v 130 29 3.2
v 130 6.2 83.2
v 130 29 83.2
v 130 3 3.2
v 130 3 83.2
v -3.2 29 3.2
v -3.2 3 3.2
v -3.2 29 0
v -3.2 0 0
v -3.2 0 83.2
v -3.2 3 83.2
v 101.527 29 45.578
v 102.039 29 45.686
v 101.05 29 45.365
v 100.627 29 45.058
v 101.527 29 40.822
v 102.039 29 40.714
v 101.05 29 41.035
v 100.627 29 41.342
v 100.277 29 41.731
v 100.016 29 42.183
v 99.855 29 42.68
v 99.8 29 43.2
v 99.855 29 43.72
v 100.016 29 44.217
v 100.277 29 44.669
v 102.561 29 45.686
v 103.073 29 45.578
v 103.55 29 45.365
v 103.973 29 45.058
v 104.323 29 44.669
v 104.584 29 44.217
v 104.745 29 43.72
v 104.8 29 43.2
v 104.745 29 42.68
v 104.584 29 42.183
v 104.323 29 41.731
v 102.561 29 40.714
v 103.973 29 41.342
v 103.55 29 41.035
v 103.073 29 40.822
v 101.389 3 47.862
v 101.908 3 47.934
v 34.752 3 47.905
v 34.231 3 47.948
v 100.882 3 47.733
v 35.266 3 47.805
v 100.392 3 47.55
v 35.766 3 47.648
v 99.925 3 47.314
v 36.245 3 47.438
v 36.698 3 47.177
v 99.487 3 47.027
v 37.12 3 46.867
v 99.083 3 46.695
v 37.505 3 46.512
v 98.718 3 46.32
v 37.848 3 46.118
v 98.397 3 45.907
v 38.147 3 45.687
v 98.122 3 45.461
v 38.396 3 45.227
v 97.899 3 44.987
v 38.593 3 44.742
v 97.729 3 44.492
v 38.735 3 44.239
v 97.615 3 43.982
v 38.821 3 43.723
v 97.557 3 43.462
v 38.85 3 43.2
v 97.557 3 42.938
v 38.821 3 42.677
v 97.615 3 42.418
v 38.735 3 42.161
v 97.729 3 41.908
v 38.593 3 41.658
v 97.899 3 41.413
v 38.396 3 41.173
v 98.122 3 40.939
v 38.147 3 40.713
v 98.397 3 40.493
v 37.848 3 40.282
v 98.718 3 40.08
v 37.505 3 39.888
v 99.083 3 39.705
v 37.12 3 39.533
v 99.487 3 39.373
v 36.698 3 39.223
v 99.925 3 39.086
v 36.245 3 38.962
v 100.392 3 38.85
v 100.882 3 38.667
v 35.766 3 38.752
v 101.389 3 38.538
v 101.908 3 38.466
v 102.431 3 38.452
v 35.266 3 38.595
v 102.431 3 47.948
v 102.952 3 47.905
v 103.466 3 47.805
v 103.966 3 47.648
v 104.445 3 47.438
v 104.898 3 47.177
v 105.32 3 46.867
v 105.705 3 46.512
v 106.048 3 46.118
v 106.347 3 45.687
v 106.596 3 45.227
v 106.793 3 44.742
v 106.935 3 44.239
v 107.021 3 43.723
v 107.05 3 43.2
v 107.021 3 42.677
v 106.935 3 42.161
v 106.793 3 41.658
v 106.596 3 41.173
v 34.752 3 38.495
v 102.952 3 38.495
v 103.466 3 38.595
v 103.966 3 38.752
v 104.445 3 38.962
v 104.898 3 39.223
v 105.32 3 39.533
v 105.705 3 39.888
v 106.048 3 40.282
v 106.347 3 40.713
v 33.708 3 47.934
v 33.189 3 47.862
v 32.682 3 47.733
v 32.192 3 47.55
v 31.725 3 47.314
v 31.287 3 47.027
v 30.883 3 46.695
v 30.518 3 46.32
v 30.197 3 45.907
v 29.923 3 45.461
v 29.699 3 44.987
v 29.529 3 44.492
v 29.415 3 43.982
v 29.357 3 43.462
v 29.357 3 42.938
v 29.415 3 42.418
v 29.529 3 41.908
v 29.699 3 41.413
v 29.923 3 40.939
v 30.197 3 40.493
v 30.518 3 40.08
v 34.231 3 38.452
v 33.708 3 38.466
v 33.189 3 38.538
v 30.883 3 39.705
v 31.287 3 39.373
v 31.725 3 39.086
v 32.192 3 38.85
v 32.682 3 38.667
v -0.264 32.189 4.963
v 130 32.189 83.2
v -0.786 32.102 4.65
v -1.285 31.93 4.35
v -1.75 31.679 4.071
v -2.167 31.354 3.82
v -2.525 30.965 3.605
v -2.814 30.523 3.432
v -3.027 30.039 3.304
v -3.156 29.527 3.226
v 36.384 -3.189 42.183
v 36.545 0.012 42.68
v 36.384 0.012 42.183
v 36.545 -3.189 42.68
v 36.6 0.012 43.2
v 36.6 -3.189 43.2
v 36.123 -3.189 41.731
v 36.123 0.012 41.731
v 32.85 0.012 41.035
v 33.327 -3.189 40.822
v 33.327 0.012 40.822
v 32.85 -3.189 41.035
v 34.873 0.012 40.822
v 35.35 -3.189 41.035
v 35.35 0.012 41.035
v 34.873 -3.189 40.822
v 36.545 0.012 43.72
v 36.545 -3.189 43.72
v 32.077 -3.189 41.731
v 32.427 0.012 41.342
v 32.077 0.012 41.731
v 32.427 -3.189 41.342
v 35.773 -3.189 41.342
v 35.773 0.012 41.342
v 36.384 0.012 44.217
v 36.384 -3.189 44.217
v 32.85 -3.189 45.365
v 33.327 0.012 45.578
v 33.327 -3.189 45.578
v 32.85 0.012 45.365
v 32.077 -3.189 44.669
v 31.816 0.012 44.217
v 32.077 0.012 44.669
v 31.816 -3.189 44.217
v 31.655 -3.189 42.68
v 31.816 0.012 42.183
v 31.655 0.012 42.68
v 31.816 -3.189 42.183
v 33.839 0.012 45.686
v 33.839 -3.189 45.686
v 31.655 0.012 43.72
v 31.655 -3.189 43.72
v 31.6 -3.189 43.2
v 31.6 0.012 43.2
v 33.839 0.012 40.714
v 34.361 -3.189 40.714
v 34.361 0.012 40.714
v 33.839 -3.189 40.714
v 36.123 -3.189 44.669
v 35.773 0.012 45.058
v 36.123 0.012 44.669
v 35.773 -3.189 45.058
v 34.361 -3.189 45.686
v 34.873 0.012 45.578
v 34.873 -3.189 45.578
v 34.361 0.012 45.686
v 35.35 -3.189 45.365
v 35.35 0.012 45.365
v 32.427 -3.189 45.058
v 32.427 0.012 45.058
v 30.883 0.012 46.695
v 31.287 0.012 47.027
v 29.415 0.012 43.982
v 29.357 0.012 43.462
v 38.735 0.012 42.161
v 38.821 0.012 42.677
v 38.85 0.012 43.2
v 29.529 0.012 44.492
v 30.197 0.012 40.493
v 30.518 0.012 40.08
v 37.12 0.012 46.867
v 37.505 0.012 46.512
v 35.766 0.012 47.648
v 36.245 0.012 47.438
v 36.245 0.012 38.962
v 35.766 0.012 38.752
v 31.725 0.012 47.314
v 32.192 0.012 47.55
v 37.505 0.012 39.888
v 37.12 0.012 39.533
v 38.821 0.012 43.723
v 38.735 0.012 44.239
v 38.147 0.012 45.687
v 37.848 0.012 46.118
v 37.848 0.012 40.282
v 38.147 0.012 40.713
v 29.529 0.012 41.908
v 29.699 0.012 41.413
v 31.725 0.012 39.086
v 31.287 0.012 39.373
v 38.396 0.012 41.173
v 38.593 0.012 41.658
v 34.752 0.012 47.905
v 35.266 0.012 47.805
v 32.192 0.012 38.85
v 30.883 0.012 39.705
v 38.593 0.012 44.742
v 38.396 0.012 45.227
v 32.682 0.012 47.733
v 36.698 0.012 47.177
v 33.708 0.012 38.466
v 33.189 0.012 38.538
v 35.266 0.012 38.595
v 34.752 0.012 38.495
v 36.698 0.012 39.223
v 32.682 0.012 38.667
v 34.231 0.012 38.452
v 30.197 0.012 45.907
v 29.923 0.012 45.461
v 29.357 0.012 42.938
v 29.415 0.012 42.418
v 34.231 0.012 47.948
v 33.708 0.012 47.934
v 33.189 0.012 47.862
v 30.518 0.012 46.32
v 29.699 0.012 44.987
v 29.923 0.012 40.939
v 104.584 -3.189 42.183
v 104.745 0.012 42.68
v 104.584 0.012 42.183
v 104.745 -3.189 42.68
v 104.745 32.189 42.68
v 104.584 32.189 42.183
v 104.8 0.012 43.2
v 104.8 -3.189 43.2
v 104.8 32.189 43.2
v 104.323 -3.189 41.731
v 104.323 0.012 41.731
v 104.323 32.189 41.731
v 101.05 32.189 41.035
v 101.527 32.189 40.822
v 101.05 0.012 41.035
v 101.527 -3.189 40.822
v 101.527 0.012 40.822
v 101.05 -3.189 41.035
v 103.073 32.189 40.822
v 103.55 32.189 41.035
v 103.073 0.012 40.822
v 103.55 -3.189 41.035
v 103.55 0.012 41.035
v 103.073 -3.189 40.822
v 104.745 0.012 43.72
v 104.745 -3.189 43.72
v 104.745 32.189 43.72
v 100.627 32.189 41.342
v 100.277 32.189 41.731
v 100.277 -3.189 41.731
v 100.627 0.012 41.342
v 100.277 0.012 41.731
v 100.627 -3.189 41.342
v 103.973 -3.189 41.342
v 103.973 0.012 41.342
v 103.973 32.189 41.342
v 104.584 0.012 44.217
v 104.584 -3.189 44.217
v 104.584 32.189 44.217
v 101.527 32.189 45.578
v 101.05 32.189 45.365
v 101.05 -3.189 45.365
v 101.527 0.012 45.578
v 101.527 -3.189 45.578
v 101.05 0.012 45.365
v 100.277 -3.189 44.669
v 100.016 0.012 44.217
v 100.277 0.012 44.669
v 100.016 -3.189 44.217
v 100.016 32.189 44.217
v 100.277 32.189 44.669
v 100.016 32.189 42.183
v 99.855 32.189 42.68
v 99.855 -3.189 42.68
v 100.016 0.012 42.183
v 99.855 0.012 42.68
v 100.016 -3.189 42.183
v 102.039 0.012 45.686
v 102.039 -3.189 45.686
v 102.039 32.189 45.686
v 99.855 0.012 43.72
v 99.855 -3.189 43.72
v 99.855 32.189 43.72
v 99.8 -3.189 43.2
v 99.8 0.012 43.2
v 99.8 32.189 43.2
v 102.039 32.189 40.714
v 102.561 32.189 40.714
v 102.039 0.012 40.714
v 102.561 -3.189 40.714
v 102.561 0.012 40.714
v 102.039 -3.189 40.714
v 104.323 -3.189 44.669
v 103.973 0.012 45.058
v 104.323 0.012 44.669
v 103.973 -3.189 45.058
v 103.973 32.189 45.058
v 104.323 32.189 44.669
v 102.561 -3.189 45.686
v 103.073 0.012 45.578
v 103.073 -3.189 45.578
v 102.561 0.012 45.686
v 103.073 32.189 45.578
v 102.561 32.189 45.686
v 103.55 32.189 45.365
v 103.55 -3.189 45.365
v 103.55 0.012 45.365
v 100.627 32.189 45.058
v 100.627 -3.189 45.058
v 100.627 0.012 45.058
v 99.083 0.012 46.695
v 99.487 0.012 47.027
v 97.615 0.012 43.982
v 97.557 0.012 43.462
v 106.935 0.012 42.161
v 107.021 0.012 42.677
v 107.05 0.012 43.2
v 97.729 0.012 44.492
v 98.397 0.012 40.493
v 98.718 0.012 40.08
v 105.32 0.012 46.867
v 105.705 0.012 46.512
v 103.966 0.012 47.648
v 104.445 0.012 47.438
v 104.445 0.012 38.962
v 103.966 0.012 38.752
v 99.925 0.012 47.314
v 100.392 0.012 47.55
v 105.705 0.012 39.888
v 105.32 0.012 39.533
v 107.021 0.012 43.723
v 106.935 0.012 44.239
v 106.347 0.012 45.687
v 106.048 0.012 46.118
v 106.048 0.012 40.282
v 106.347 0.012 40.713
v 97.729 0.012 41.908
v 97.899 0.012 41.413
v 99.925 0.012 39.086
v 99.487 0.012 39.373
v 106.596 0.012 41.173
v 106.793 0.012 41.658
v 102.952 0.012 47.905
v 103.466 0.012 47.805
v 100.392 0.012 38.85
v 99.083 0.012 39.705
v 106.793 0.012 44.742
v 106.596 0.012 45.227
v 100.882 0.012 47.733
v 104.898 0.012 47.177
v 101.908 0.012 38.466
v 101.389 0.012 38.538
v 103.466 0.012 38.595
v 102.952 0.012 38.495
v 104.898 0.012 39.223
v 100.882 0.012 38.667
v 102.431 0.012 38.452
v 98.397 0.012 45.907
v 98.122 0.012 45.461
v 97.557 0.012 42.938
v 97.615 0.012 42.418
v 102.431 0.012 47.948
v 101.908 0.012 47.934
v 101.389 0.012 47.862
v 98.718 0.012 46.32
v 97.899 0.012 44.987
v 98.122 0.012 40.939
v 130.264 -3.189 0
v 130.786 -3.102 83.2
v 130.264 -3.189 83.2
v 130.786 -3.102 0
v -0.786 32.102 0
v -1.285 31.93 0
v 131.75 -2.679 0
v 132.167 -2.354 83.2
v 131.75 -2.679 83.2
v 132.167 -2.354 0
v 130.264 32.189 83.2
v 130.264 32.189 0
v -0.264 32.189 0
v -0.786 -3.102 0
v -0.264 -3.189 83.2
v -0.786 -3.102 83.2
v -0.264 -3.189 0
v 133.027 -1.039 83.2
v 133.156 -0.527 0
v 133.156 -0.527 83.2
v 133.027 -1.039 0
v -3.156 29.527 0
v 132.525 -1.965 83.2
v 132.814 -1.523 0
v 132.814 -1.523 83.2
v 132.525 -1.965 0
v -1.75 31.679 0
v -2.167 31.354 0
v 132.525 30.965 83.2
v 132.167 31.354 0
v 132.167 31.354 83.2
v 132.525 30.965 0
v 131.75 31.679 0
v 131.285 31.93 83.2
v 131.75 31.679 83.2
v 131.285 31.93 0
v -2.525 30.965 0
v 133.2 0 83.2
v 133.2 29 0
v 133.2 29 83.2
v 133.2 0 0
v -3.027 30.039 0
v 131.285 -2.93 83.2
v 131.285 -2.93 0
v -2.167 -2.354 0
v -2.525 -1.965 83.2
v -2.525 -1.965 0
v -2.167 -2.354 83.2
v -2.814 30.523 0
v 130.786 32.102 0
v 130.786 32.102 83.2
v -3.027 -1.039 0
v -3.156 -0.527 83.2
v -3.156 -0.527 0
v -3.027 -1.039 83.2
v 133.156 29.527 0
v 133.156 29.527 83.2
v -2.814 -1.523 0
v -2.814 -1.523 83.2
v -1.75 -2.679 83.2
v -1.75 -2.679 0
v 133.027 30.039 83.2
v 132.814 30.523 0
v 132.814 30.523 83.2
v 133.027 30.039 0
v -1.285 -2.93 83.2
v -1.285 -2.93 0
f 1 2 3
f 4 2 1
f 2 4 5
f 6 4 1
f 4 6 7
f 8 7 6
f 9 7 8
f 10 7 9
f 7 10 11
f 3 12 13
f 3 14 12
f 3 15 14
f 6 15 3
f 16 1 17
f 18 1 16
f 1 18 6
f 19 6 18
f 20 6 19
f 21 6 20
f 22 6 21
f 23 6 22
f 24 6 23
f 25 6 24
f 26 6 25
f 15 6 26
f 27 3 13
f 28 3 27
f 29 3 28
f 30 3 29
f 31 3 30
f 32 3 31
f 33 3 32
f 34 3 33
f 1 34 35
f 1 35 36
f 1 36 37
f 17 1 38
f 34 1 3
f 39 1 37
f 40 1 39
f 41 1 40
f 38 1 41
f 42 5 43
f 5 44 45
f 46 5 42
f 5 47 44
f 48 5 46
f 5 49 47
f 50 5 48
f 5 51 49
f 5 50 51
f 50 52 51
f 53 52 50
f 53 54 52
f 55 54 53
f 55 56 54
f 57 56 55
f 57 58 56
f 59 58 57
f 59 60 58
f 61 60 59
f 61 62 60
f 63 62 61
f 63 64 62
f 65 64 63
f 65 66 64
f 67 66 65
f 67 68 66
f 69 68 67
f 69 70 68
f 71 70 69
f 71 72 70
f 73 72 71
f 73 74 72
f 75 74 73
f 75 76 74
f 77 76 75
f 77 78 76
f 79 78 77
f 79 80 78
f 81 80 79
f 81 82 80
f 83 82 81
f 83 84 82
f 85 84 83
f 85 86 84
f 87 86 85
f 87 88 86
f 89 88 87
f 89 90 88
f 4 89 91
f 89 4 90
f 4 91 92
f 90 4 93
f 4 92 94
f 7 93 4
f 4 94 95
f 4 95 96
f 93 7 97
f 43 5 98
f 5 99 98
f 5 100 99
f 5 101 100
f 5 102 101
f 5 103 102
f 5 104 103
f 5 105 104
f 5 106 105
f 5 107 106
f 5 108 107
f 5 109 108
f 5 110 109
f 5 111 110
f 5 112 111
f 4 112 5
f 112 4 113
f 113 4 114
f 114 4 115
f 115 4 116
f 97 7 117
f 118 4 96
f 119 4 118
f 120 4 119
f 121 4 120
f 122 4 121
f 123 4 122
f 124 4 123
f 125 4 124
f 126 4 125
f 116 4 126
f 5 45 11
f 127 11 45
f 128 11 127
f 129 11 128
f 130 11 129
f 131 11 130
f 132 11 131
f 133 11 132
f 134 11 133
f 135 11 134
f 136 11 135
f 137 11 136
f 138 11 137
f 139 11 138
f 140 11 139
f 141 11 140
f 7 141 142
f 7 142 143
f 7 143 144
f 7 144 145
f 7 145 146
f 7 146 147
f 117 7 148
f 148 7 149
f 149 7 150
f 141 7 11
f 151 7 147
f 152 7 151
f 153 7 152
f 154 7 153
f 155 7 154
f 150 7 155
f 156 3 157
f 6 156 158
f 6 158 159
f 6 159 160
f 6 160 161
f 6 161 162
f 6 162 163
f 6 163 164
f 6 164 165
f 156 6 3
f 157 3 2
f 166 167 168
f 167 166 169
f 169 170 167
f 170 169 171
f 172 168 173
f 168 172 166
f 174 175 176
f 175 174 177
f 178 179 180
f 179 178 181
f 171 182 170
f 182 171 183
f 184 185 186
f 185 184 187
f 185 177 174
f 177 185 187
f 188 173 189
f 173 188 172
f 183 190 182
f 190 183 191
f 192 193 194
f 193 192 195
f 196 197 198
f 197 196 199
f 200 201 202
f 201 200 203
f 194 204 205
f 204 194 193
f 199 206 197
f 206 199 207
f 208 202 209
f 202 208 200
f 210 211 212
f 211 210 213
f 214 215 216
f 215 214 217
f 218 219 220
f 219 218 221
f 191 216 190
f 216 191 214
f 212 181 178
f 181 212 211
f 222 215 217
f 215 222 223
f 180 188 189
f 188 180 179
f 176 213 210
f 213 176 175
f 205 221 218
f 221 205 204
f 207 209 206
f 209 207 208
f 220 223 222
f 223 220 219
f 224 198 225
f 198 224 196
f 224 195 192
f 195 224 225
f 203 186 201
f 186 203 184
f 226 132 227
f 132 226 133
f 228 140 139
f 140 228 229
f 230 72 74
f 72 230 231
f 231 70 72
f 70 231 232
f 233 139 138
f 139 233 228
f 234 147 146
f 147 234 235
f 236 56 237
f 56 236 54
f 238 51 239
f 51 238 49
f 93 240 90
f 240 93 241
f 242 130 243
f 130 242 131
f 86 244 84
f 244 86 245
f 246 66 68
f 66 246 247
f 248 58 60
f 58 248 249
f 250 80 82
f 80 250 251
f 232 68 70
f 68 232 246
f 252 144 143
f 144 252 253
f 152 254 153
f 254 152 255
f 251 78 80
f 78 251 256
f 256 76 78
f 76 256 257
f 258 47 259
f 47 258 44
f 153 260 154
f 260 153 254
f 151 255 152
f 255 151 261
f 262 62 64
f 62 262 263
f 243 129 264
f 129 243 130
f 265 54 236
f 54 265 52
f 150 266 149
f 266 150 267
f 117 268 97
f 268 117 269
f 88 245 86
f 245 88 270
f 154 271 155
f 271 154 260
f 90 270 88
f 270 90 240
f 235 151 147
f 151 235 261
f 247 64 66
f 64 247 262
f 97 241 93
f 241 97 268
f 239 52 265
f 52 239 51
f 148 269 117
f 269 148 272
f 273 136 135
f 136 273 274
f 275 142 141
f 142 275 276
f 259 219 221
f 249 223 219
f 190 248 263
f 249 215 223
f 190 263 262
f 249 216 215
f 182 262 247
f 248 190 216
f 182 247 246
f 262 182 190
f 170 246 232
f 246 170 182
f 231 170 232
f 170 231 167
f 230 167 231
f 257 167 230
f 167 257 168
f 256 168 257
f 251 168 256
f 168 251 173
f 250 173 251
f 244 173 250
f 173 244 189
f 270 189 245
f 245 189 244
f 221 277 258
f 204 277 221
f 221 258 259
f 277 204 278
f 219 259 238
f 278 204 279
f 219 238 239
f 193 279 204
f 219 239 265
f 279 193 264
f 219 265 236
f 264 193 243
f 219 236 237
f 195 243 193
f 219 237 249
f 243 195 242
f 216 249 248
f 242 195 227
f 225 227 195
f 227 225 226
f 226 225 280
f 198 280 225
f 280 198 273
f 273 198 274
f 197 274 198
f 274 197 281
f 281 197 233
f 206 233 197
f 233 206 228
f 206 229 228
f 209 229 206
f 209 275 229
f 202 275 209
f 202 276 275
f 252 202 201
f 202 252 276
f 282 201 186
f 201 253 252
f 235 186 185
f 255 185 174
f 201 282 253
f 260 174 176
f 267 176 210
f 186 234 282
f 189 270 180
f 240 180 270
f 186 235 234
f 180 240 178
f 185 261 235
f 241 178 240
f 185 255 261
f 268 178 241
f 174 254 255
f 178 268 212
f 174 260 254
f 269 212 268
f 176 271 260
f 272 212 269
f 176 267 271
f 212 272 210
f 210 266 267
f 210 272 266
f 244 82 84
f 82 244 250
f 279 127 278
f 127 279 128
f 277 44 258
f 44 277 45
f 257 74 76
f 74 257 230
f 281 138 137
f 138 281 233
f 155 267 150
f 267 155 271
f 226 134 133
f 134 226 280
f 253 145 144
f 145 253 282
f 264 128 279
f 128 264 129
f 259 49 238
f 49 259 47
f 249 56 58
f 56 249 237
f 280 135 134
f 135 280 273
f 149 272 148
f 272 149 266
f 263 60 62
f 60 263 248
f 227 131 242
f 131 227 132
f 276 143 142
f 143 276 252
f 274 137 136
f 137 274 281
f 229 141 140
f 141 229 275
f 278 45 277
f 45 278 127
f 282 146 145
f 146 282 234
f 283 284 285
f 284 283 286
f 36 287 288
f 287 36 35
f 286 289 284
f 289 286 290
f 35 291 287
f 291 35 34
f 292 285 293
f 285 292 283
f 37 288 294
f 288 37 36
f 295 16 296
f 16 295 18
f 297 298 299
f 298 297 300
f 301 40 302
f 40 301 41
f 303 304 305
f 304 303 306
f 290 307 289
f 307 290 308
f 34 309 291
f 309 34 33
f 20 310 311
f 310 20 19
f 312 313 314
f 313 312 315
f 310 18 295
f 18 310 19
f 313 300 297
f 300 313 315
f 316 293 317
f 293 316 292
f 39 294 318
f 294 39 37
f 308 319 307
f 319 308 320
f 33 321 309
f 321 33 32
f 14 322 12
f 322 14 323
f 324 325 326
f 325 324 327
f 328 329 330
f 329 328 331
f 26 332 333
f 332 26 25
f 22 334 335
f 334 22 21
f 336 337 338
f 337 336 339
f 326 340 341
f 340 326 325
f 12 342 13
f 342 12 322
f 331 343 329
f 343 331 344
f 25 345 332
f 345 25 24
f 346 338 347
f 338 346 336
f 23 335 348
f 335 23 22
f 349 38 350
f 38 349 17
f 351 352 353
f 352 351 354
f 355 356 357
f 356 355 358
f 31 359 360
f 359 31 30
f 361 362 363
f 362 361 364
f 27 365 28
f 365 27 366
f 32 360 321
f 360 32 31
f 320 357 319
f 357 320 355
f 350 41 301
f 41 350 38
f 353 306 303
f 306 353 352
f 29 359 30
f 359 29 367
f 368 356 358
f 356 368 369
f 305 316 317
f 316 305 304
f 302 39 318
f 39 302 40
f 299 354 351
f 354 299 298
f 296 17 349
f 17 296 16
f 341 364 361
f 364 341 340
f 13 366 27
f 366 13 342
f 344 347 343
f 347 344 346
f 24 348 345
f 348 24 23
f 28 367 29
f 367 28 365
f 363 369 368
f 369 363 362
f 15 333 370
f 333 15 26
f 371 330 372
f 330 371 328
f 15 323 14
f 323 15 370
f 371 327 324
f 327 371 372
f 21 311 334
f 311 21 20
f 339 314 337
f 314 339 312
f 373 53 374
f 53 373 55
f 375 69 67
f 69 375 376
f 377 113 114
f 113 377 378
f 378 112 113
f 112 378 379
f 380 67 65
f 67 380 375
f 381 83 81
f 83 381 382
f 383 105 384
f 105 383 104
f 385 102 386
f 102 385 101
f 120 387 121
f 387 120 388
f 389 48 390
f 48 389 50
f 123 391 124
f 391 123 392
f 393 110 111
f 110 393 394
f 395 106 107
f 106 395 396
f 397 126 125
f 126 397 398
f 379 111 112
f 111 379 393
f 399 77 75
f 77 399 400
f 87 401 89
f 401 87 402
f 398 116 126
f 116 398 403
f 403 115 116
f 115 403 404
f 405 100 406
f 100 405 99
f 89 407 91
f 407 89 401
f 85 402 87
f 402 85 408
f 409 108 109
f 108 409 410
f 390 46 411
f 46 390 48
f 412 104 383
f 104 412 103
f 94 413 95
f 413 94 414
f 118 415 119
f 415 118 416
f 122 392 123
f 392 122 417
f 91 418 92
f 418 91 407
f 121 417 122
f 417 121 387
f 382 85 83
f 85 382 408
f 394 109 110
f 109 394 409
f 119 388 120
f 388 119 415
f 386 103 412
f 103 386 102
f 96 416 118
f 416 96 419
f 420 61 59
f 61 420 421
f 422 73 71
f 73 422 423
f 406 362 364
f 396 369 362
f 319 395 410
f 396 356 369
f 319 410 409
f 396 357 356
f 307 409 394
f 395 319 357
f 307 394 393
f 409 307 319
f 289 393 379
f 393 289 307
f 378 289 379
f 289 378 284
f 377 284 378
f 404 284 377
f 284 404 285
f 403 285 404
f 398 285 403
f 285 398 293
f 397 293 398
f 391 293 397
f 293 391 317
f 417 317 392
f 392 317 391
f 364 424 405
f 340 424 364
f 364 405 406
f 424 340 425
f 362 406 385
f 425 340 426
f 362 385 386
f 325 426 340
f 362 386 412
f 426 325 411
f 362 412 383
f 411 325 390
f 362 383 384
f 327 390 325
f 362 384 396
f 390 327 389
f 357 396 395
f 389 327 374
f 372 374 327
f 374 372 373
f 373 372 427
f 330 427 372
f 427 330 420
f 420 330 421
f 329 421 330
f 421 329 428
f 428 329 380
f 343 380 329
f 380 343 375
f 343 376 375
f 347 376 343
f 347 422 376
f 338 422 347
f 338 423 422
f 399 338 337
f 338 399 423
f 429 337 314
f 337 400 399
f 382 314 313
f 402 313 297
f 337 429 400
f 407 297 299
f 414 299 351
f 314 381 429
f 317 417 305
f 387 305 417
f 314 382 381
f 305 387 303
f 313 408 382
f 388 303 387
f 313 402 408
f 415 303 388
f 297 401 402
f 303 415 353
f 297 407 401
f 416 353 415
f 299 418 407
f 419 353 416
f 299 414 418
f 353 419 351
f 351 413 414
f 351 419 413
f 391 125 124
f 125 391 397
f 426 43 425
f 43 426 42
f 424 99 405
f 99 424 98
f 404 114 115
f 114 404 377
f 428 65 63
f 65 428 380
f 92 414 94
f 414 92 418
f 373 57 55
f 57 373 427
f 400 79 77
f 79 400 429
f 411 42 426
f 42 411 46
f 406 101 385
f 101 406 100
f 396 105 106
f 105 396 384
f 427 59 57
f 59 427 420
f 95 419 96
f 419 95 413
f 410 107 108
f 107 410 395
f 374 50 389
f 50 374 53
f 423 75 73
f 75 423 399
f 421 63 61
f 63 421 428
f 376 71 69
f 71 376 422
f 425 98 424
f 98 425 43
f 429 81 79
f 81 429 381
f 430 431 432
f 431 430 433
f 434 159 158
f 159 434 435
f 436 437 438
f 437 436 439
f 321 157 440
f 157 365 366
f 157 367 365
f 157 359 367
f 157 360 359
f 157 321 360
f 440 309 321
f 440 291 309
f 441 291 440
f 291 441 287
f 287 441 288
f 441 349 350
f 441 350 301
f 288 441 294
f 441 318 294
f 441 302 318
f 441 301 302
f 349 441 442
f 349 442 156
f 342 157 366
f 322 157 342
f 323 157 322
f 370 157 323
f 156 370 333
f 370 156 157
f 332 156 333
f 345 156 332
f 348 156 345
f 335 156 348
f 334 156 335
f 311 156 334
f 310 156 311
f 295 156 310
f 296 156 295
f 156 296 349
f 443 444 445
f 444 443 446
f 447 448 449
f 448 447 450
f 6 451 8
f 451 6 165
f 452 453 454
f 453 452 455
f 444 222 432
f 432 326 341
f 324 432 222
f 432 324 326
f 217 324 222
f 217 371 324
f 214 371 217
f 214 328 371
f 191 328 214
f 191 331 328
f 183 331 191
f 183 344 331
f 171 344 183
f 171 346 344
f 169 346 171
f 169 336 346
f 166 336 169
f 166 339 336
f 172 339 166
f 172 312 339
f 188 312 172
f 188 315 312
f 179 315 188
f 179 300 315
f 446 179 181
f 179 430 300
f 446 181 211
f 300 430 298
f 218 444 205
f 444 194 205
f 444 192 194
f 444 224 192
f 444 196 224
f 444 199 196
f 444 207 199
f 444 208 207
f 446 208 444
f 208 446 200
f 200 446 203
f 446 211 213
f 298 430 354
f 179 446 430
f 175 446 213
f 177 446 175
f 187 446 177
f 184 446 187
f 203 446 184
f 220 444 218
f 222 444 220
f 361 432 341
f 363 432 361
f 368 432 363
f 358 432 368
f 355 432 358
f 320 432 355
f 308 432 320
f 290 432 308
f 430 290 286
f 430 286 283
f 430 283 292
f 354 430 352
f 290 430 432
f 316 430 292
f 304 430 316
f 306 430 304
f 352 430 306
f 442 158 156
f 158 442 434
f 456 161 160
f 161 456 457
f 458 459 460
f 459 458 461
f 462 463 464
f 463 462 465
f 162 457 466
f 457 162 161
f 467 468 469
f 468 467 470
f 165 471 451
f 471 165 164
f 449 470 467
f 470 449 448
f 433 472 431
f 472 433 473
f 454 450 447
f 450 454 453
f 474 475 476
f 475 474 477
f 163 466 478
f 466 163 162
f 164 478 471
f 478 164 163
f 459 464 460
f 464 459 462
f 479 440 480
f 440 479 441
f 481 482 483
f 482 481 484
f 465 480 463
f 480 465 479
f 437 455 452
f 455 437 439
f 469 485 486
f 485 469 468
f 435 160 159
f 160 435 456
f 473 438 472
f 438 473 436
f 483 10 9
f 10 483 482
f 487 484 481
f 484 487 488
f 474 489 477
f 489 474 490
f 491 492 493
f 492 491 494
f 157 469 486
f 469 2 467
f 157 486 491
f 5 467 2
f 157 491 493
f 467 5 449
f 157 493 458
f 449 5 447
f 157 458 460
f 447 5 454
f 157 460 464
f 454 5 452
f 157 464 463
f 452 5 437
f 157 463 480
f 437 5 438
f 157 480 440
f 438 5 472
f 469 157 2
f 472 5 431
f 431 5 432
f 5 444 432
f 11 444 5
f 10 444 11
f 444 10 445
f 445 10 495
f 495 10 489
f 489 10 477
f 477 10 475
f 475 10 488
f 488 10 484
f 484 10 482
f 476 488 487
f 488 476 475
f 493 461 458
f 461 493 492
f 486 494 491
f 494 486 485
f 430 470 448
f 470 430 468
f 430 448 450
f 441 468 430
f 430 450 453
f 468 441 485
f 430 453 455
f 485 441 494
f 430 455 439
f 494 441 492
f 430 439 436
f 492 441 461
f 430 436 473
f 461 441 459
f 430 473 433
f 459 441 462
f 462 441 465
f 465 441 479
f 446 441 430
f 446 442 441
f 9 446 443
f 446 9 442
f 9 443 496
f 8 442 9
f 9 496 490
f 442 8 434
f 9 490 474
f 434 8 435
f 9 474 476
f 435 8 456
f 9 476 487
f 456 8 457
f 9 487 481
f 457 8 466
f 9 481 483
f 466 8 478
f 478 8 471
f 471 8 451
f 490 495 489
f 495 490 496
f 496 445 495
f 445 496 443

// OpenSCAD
// file: atis_lib.scad
module gyuru(r1, r2,h, w, center=false){
    difference(){
        cylinder(r1=r1,r2=r2,h, center=center, $fn=12*r1);
        cylinder(r1=r1-w, r2=r2-w,h, center=center, $fn=12*(r1-w));
    }
}

//inset_width= min(nozzle dia/2, 0.4)
module inset_first_layer(inset_height=0.31,inset_width=0.2, render=false)
{   
    if (render == true){
        difference()
        { 
            children();

            translate([0,0,-1])
            linear_extrude(height=inset_height+1)
            difference()
            {
                offset(r = inset_width) 
                projection(cut=true) 
                translate([0,0,-inset_height])
                children();

                offset(r = -inset_width) 
                projection(cut=true) 
                translate([0,0,-inset_height])
                children();
            }
        } 
    }
    else{
        echo("Inset not rendered!");
    }
} 

module deszka(m, sz, v, vastagsag, cimke){
    cube([m,sz,v], center=true);
    if (m == vastagsag){
        t = sz * v;
        echo(cimke, m , sz, v, t/1000/1000);
    } else if (sz == vastagsag){
            t = m*v;
            echo(cimke, m , sz, v, t/1000/1000);
    } else if (v == vastagsag){
            t = m*sz;
            echo(cimke, m , sz, v, t/1000/1000);
    }
    //echo(cimke, m , sz, v, t);
}



// csm=[melyseg, szelesseg, magassag, also resz magassag, ,henger sugara

//csatlakozo([5,10,20,2,2,1.5]);

module csatlakozo(csm){
    cw = csm[0];
    sz = csm[1];
    h = csm[2];
    ch = csm[3];
    ny = csm[4];
    R=csm[5];
    translate([-cw/2, -sz/2, -h/2]){
        cube([cw,sz,ch]);
        translate([0,sz,ch])
            rotate([90,0,0])
                linear_extrude(height=sz)polygon([[0,0], [cw, 0], [0,cw+1], [0,0]]);
        translate([0,(sz-ny)/2,0])
        intersection()
        {
            translate([0,R+ny/2,0])
                rotate([90,0,0])
                    linear_extrude(height=2*R)polygon([[0,0], [cw, 0], [cw, h-cw-1], [0,h], [0,0]]);
            union(){
                cube([ny, ny,h]);
                translate([cw-R-0.5,ny/2,0]) cylinder(r=R, h=h,$fn=80);
            }
        }
    }
}

module gombolyitett_csatlakozo(csm){
    cw = csm[0]-1;
    sz = csm[1]-2;
    h = csm[2]-2;
    ch = csm[3];
    ny = csm[4];
    R=csm[5];
    translate([-cw/2, -sz/2, -h/2]){
        cube([cw,sz,ch]);
        translate([0,sz,ch])
            rotate([90,0,0])
                linear_extrude(height=sz)polygon([[0,0], [cw, 0], [0,cw+1], [0,0]]);
        translate([0,(sz-ny)/2,0])
        intersection()
        {
            translate([0,R+ny/2,0])
                rotate([90,0,0])
                    linear_extrude(height=2*R)polygon([[0,0], [cw, 0], [cw, h-cw-1], [0,h], [0,0]]);
            union(){
                cube([ny, ny,h]);
                translate([cw-R-0.5,ny/2,0]) cylinder(r=R, h=h,$fn=80);
            }
        }
    }
}
// main file
use <atis_lib.scad>

ww=3.2;

csavar_fej_vastagsag=3;

lenovo_t480();

//macbook_pro();

//lenovo_tolto();

//macbook_pro();

//taviranyito_tarto();

//inhalator_tarto();

//mirror()macbook_pro();

module lenovo_t480(){  // make me
    falitarto(130, 80, 26,0,0,0,0,false);
}

module macbook_pro(){  // make me
    falitarto(130, 80, 28,0,0,0,0,false);
}

module hp_tolto(){ // make me
    falitarto(128, 52, 32, 24, 31, 21,4, true);
}

module lenovo_tolto(){ // make me
    falitarto(109, 47, 30, 18, 23, 12,6, true);
}

module falitarto(belso_w=120,
               belso_h=80,
               belso_d=50,
               cs_w = 20,
               cs_h = 30,
               cs_z,
               cs_y,
               egybe=true)
{
    difference(){
        minkowski(){
            cube([belso_w, belso_d+csavar_fej_vastagsag, belso_h]);
            cylinder(r=ww, h=ww, $fn=12*ww);
        }
        if (egybe){
            translate([0,csavar_fej_vastagsag,ww])
                cube([belso_w, belso_d, belso_h+5*ww]);
            translate([0,ww+csavar_fej_vastagsag,2*ww])rotate([0,-atan((belso_h-ww)/belso_w),0])cube([sqrt(belso_w*belso_w+belso_h*belso_h)+2*ww,belso_d+1,belso_h]);
        }
        else{
            translate([-ww,csavar_fej_vastagsag,ww])
                cube([belso_w+ww, belso_d, belso_h+5*ww]);
            translate([-ww,ww+csavar_fej_vastagsag,ww])rotate([0,-atan(belso_h/(belso_w+ww)),0])cube([sqrt(belso_w*belso_w+belso_h*belso_h)+2*ww,belso_d+1,belso_h]);
        }
        translate([-ww,ww+csavar_fej_vastagsag,2*ww])cube([ww,belso_d,belso_h]);

        
        
        for(x=[(belso_w+2*ww)/4, (belso_w+2*ww)*3/4]){
            translate([x,0,(belso_h+2*ww)/2])rotate([-90,0,0]){
                r_csavar=2.5;
                translate([0,0,-2*ww])cylinder(r=r_csavar, h=belso_d+4*ww+csavar_fej_vastagsag, $fn=12*r_csavar);
                translate([0,0,0.012])cylinder(r=1.9*r_csavar, h=csavar_fej_vastagsag, $fn=1.9*r_csavar*12);
            }
        }
        translate([belso_w-1, cs_y + csavar_fej_vastagsag, cs_z+ww])cube([2*ww, cs_w, cs_h]);
    }
}

module taviranyito_tarto(){ // make me
    /* ww=3;
    gr=1;
    sz = 55;
    m = 25;
    h = 70;
    */
    dobozos_tarto(3,1,55,25,70);
}

module dobozos_tarto(ww, gr, sz, m, h){
    ksz=sz+2*ww-2*gr;
    km=m+2*ww-2*gr;
    kh=h+ww-2*gr;

    difference(){
        minkowski()
        {
            difference(){
                
                cube([ksz, km, kh], center=true);
                translate([0,-ww+2*gr,h/5+ww+h/2])cube([ksz,km,h],center=true);
                translate([0,0,ww-2*gr])cube([sz+2*gr,m+2*gr,h+gr],center=true);
                translate([0,m/2,h/5+ww+abs(sz+gr-h)/2])rotate([90,0,0])cylinder(r=sz/2+gr,h=m+ww, $fn=12*sz/2);
            }
            sphere(r=gr, $fn=gr*12);
        }
        for(z = [-h/4,h/4]){
            translate([0,km/2+gr,z])rotate([0,-90,90]){
                kivagas(13,4,ww);
                cylinder(r=4,h=ww, $fn=12*4);
            }
        }
    }
}

module inhalator_tarto(){ // make me
    // belso méret: 77x42mm
    
    dobozos_tarto(3,1,77,43.5,70);
}
